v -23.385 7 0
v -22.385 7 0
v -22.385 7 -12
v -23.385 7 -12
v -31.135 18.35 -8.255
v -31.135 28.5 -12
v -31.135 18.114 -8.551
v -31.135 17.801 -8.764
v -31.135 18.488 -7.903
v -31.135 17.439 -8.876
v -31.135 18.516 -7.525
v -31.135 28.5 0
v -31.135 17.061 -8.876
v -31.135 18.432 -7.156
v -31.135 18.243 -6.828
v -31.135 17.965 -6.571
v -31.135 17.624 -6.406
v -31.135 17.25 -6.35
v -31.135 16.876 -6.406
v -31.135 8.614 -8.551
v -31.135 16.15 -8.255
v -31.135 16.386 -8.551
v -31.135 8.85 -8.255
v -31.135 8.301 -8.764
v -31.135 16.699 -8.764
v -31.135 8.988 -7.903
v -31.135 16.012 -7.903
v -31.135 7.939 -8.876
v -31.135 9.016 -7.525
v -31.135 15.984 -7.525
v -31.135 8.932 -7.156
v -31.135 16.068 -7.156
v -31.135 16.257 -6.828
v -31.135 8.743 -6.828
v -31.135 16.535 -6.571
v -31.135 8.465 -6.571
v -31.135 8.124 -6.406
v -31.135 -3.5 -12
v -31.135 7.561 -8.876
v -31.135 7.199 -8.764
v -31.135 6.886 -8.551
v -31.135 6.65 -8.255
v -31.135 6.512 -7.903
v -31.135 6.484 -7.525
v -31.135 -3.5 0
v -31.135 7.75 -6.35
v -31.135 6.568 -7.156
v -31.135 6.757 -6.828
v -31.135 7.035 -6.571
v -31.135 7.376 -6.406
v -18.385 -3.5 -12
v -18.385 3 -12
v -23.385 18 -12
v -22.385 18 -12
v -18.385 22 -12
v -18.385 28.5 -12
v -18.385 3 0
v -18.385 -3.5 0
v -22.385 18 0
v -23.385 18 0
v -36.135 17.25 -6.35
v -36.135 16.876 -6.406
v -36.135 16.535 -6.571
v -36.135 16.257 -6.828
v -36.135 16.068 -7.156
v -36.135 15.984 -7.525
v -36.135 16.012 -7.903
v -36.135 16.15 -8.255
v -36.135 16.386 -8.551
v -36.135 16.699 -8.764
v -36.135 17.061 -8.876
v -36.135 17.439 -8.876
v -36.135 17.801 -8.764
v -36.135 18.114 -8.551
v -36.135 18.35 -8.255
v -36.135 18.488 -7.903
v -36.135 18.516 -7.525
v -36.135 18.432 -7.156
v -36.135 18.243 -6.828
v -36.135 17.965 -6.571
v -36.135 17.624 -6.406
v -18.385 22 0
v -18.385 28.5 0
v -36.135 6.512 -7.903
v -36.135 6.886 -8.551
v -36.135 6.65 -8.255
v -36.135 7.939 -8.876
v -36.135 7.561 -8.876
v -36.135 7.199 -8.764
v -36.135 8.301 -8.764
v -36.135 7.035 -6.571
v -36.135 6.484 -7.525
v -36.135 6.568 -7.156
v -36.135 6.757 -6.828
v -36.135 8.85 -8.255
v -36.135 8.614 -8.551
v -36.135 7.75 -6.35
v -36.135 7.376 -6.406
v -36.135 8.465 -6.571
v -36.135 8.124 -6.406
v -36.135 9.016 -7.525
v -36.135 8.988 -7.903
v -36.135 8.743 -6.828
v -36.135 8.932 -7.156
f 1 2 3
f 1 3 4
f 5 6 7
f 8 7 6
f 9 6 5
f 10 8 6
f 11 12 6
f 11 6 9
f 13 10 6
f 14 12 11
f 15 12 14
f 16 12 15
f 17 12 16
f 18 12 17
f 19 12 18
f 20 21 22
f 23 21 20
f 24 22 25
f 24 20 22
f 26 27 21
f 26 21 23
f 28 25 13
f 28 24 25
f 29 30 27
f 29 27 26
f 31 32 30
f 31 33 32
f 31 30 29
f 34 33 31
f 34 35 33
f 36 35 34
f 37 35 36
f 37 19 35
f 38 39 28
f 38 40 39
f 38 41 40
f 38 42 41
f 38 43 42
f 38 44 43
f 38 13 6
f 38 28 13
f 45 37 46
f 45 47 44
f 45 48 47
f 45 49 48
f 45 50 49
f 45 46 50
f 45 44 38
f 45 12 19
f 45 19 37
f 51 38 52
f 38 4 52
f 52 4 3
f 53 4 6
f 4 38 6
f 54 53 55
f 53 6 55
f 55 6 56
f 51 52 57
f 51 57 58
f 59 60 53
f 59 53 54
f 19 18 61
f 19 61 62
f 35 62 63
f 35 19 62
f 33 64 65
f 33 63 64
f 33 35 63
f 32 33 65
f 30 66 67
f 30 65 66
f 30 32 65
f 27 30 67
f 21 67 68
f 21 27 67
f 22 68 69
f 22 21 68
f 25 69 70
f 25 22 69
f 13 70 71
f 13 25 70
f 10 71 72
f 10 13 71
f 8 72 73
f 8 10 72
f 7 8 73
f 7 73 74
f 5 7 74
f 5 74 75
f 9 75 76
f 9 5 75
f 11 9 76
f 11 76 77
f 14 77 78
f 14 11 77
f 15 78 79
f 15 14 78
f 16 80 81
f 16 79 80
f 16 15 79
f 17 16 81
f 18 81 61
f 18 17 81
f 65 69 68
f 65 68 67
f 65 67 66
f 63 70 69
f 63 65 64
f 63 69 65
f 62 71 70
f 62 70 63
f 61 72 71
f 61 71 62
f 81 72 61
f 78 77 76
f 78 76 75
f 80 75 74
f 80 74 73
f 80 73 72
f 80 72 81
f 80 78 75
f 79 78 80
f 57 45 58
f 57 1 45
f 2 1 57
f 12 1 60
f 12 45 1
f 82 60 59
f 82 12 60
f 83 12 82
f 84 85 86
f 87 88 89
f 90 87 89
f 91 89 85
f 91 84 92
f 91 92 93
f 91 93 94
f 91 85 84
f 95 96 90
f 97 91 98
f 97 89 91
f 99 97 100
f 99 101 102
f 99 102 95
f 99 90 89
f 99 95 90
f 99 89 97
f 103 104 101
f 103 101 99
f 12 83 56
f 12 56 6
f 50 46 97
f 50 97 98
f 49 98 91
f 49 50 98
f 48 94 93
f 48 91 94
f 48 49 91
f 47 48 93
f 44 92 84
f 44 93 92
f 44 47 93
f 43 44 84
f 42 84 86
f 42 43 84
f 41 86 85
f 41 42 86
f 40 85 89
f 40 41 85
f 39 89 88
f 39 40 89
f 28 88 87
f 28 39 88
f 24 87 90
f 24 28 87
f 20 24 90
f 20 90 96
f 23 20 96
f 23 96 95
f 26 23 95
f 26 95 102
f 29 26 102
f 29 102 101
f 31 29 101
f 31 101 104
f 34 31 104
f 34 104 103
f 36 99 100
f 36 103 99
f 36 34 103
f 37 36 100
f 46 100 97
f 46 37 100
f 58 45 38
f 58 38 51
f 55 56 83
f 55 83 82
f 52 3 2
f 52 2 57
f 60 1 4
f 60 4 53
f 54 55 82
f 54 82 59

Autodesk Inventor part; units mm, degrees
ref_plane "YZ Plane" through (0, 0, 0) normal (1, 0, 0) x (0, 1, 0)
ref_plane "XZ Plane" through (0, 0, 0) normal (0, 1, 0) x (-1, 0, 0)
ref_plane "XY Plane" through (0, 0, 0) normal (0, 0, 1) x (1, 0, 0)
sketch "Sketch1" plane through (0, 0, 0) normal (0, 0, 1) x (1, 0, 0)
  line L0 (-18.3846, 28.5) -> (-18.3846, 22)
  line L1 (-18.3846, 22) -> (-22.3846, 18)
  line L2 (-22.3846, 18) -> (-22.3846, 7)
  line L3 (-22.3846, 7) -> (-18.3846, 3)
  line L4 (-18.3846, 3) -> (-18.3846, -3.5)
  line L5 (-18.3846, 28.5) -> (-31.1346, 28.5)
  line L6 (-31.1346, 28.5) -> (-31.1346, -3.5)
  line L7 (-31.1346, -3.5) -> (-18.3846, -3.5)
  line L8 (-22.3846, 7) -> (-23.3846, 7)
  line L9 (-23.3846, 7) -> (-23.3846, 18)
  line L10 (-23.3846, 18) -> (-22.3846, 18)
  line L11 (-31.1346, 11.0301) -> (-37.4846, 11.0301) construction
  point P0 (0, 0)
  dimension "d0" = 1
  dimension "d1" = 6.35
  dimension "d2" = 8.75
  dimension "d13" = 135
  dimension "d14" = 135
  dimension "d15" = 11
  dimension "d16" = 12.75
  dimension "d17" = 32
extrude "Extrusion1" add sketch "Sketch1" against normal blind 12 contours L0 L1 L10 L9 L8 L3 L4 L7 L6 L5
sketch "Sketch3" plane through (-31.1346, -3.5, 0) normal (-1, 0, 0) x (0, 0, 1)
  line L0 (0, 32) -> (0, 0) projected
  line L1 (0, 32) -> (-12, 32) projected
  line L2 (-12, 0) -> (-12, 32) projected
  line L3 (0, 0) -> (-12, 0) projected
  circle A0 centre (-7.62, 11.25) radius 1.27
  circle A1 centre (-7.62, 20.75) radius 1.27
  line L4 (-12, 21.5) -> (-12, 10.5) construction
  line L5 (-12, 16) -> (0, 16) construction
  point P0 (0, 3.5)
  dimension "d8" = 2.54
  dimension "d9" = 9.5
  dimension "d10" = 7.62
extrude "Extrusion3" add sketch "Sketch3" along normal blind 5 contours A0 | A1
properties part number "Limit Adapter"
